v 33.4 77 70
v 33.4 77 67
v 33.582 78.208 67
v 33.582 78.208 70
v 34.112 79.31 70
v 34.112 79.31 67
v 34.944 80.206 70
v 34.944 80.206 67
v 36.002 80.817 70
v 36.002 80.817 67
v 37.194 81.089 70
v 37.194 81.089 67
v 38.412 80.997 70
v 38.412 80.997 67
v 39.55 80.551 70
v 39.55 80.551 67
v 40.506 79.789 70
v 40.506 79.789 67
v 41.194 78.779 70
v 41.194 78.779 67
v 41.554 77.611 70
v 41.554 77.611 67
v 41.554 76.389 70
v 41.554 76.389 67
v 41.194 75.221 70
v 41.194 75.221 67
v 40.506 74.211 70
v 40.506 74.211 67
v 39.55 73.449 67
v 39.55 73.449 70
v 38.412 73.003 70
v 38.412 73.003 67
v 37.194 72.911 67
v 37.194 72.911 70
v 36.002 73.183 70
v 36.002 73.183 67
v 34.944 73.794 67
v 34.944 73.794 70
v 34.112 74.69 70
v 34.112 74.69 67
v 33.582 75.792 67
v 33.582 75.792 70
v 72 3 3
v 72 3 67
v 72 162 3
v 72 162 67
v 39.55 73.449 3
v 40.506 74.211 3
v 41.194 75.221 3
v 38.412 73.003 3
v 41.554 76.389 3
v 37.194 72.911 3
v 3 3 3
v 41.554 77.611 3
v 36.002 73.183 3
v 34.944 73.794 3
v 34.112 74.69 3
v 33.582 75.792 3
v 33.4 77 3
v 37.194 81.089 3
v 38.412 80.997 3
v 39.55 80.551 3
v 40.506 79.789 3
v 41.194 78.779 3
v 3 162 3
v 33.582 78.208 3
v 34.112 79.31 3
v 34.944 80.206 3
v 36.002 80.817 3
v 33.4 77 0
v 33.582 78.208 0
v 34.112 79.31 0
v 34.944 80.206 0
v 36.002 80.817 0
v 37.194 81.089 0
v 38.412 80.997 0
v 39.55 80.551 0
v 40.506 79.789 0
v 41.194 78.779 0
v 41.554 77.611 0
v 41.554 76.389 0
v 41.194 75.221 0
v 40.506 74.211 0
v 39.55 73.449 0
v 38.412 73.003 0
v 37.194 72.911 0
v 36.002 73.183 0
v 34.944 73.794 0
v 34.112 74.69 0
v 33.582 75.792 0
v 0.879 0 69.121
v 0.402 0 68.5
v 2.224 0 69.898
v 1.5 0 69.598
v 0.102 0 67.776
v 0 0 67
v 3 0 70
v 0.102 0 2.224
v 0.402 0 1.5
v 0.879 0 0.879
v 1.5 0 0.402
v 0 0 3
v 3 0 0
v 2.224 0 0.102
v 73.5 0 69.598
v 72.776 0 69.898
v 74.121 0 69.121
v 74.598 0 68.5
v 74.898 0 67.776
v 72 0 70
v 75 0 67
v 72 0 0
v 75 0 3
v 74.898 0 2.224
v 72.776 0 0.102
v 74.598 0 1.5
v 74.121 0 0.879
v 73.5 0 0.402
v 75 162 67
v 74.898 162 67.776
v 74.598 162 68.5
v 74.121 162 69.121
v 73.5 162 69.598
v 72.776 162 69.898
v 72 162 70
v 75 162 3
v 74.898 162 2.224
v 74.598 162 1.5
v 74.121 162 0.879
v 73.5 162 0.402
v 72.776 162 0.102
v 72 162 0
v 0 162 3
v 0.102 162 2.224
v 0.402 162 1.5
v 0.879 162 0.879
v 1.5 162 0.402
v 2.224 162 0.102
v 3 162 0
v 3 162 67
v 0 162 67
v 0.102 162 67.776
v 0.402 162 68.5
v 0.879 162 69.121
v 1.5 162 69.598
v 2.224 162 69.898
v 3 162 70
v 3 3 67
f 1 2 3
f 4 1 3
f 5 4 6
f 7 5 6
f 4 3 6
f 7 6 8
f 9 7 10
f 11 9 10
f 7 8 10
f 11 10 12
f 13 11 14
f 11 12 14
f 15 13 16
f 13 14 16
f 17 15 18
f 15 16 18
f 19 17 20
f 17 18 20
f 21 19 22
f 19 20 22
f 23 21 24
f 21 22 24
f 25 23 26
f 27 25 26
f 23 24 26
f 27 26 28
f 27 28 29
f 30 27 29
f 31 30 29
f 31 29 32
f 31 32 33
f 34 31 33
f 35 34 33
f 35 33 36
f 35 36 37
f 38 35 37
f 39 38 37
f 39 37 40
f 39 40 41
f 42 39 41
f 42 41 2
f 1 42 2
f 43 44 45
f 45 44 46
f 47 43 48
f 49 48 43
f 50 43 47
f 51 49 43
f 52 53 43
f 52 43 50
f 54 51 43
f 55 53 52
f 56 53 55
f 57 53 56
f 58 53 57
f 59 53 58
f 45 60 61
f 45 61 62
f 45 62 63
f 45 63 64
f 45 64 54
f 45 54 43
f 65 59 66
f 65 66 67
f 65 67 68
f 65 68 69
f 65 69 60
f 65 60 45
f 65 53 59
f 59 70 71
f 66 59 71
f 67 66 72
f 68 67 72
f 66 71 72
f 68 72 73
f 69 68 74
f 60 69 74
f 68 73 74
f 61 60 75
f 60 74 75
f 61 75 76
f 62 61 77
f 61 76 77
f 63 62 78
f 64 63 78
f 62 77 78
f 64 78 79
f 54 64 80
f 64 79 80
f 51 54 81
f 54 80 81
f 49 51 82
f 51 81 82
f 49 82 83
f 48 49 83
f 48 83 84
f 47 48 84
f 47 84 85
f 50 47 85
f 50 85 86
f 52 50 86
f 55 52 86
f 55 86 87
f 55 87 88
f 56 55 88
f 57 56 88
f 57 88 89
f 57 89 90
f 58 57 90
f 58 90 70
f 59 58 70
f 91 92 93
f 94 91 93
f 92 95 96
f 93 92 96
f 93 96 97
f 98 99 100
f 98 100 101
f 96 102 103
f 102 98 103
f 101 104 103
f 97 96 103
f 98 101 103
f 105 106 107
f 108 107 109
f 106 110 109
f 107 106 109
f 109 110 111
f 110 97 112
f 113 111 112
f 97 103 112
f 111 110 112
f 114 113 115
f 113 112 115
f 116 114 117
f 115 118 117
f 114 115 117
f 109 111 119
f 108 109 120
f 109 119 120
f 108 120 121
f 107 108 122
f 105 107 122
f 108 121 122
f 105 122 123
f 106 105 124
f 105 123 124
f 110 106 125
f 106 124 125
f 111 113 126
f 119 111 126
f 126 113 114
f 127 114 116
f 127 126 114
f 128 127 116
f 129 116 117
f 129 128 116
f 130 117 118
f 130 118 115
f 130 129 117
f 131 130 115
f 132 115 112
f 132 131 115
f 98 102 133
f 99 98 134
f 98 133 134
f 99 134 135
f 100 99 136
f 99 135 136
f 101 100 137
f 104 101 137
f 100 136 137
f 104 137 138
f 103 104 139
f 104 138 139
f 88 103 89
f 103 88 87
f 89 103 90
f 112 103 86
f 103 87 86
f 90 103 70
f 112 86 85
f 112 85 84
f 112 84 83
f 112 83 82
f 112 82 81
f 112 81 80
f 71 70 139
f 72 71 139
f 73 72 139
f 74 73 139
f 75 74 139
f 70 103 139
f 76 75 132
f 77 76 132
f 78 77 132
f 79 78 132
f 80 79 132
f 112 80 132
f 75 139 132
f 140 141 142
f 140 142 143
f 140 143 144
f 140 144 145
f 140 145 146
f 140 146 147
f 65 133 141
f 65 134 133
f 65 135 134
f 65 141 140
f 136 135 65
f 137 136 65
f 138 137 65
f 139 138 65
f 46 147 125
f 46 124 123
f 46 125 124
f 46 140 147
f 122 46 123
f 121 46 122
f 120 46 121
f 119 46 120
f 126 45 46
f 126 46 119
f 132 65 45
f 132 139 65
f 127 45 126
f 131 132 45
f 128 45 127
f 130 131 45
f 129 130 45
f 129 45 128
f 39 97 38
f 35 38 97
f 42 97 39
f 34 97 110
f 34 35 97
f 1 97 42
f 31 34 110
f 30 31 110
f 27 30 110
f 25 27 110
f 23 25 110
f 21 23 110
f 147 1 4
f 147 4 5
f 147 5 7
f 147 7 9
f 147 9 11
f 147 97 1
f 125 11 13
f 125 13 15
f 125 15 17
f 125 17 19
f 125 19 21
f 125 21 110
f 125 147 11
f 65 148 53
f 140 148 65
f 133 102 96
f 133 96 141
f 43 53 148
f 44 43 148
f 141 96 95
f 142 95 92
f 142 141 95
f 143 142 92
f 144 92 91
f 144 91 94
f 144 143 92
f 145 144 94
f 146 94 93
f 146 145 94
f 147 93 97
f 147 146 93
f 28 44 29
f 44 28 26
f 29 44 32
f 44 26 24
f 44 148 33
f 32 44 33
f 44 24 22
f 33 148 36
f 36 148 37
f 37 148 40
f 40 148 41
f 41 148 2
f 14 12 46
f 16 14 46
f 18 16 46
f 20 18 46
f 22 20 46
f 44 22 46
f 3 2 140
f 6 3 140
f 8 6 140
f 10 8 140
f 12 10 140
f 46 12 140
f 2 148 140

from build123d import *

# Parameters (mm, degrees)
SKETCH_1_W         = 75
SKETCH_1_H         = 162
BLOCKEXTRUDE_DEPTH = 70
FILLET_2_R         = 3
SHELL_START        = 3
SHELL_1_OUTLINE_W  = 159
SHELL_1_OUTLINE_H  = 64
SHELL_1_DEPTH      = 69
SKETCH_2_R         = 4.1
CABLE_ENTRY_DEPTH  = 192.752444574


# Read off the part's stored shape, not the designer's step: 抽壳1
with BuildPart() as part:
    # 草图1 → BlockExtrude (new body)
    with BuildSketch(Plane.XY):
        with Locations((37.5, 81)):
            Rectangle(SKETCH_1_W, SKETCH_1_H)
    extrude(amount=BLOCKEXTRUDE_DEPTH)

    # Fillet 2
    fillet_2_edges = [part.edges().sort_by_distance(p)[0] for p in [
        (75, 81, 70),
        (0, 81, 70),
        (75, 81, 0),
        (0, 81, 0),
    ]]
    fillet(fillet_2_edges, radius=FILLET_2_R)

    # 抽壳1 outline → 抽壳1 (cut)
    with BuildSketch(Plane.YZ.offset(SHELL_START)):
        with Locations((82.5, 35)):
            Rectangle(SHELL_1_OUTLINE_W, SHELL_1_OUTLINE_H)
    extrude(amount=SHELL_1_DEPTH, mode=Mode.SUBTRACT)

    # 草图2 → Cable_entry (cut, through all)
    with BuildSketch(Plane(origin=(0, 0, 0), x_dir=(-1, 0, 0), z_dir=(0, 0, -1))):
        with Locations((-37.5, 77)):
            Circle(SKETCH_2_R)
    extrude(amount=-CABLE_ENTRY_DEPTH, mode=Mode.SUBTRACT)


solid = part.part
